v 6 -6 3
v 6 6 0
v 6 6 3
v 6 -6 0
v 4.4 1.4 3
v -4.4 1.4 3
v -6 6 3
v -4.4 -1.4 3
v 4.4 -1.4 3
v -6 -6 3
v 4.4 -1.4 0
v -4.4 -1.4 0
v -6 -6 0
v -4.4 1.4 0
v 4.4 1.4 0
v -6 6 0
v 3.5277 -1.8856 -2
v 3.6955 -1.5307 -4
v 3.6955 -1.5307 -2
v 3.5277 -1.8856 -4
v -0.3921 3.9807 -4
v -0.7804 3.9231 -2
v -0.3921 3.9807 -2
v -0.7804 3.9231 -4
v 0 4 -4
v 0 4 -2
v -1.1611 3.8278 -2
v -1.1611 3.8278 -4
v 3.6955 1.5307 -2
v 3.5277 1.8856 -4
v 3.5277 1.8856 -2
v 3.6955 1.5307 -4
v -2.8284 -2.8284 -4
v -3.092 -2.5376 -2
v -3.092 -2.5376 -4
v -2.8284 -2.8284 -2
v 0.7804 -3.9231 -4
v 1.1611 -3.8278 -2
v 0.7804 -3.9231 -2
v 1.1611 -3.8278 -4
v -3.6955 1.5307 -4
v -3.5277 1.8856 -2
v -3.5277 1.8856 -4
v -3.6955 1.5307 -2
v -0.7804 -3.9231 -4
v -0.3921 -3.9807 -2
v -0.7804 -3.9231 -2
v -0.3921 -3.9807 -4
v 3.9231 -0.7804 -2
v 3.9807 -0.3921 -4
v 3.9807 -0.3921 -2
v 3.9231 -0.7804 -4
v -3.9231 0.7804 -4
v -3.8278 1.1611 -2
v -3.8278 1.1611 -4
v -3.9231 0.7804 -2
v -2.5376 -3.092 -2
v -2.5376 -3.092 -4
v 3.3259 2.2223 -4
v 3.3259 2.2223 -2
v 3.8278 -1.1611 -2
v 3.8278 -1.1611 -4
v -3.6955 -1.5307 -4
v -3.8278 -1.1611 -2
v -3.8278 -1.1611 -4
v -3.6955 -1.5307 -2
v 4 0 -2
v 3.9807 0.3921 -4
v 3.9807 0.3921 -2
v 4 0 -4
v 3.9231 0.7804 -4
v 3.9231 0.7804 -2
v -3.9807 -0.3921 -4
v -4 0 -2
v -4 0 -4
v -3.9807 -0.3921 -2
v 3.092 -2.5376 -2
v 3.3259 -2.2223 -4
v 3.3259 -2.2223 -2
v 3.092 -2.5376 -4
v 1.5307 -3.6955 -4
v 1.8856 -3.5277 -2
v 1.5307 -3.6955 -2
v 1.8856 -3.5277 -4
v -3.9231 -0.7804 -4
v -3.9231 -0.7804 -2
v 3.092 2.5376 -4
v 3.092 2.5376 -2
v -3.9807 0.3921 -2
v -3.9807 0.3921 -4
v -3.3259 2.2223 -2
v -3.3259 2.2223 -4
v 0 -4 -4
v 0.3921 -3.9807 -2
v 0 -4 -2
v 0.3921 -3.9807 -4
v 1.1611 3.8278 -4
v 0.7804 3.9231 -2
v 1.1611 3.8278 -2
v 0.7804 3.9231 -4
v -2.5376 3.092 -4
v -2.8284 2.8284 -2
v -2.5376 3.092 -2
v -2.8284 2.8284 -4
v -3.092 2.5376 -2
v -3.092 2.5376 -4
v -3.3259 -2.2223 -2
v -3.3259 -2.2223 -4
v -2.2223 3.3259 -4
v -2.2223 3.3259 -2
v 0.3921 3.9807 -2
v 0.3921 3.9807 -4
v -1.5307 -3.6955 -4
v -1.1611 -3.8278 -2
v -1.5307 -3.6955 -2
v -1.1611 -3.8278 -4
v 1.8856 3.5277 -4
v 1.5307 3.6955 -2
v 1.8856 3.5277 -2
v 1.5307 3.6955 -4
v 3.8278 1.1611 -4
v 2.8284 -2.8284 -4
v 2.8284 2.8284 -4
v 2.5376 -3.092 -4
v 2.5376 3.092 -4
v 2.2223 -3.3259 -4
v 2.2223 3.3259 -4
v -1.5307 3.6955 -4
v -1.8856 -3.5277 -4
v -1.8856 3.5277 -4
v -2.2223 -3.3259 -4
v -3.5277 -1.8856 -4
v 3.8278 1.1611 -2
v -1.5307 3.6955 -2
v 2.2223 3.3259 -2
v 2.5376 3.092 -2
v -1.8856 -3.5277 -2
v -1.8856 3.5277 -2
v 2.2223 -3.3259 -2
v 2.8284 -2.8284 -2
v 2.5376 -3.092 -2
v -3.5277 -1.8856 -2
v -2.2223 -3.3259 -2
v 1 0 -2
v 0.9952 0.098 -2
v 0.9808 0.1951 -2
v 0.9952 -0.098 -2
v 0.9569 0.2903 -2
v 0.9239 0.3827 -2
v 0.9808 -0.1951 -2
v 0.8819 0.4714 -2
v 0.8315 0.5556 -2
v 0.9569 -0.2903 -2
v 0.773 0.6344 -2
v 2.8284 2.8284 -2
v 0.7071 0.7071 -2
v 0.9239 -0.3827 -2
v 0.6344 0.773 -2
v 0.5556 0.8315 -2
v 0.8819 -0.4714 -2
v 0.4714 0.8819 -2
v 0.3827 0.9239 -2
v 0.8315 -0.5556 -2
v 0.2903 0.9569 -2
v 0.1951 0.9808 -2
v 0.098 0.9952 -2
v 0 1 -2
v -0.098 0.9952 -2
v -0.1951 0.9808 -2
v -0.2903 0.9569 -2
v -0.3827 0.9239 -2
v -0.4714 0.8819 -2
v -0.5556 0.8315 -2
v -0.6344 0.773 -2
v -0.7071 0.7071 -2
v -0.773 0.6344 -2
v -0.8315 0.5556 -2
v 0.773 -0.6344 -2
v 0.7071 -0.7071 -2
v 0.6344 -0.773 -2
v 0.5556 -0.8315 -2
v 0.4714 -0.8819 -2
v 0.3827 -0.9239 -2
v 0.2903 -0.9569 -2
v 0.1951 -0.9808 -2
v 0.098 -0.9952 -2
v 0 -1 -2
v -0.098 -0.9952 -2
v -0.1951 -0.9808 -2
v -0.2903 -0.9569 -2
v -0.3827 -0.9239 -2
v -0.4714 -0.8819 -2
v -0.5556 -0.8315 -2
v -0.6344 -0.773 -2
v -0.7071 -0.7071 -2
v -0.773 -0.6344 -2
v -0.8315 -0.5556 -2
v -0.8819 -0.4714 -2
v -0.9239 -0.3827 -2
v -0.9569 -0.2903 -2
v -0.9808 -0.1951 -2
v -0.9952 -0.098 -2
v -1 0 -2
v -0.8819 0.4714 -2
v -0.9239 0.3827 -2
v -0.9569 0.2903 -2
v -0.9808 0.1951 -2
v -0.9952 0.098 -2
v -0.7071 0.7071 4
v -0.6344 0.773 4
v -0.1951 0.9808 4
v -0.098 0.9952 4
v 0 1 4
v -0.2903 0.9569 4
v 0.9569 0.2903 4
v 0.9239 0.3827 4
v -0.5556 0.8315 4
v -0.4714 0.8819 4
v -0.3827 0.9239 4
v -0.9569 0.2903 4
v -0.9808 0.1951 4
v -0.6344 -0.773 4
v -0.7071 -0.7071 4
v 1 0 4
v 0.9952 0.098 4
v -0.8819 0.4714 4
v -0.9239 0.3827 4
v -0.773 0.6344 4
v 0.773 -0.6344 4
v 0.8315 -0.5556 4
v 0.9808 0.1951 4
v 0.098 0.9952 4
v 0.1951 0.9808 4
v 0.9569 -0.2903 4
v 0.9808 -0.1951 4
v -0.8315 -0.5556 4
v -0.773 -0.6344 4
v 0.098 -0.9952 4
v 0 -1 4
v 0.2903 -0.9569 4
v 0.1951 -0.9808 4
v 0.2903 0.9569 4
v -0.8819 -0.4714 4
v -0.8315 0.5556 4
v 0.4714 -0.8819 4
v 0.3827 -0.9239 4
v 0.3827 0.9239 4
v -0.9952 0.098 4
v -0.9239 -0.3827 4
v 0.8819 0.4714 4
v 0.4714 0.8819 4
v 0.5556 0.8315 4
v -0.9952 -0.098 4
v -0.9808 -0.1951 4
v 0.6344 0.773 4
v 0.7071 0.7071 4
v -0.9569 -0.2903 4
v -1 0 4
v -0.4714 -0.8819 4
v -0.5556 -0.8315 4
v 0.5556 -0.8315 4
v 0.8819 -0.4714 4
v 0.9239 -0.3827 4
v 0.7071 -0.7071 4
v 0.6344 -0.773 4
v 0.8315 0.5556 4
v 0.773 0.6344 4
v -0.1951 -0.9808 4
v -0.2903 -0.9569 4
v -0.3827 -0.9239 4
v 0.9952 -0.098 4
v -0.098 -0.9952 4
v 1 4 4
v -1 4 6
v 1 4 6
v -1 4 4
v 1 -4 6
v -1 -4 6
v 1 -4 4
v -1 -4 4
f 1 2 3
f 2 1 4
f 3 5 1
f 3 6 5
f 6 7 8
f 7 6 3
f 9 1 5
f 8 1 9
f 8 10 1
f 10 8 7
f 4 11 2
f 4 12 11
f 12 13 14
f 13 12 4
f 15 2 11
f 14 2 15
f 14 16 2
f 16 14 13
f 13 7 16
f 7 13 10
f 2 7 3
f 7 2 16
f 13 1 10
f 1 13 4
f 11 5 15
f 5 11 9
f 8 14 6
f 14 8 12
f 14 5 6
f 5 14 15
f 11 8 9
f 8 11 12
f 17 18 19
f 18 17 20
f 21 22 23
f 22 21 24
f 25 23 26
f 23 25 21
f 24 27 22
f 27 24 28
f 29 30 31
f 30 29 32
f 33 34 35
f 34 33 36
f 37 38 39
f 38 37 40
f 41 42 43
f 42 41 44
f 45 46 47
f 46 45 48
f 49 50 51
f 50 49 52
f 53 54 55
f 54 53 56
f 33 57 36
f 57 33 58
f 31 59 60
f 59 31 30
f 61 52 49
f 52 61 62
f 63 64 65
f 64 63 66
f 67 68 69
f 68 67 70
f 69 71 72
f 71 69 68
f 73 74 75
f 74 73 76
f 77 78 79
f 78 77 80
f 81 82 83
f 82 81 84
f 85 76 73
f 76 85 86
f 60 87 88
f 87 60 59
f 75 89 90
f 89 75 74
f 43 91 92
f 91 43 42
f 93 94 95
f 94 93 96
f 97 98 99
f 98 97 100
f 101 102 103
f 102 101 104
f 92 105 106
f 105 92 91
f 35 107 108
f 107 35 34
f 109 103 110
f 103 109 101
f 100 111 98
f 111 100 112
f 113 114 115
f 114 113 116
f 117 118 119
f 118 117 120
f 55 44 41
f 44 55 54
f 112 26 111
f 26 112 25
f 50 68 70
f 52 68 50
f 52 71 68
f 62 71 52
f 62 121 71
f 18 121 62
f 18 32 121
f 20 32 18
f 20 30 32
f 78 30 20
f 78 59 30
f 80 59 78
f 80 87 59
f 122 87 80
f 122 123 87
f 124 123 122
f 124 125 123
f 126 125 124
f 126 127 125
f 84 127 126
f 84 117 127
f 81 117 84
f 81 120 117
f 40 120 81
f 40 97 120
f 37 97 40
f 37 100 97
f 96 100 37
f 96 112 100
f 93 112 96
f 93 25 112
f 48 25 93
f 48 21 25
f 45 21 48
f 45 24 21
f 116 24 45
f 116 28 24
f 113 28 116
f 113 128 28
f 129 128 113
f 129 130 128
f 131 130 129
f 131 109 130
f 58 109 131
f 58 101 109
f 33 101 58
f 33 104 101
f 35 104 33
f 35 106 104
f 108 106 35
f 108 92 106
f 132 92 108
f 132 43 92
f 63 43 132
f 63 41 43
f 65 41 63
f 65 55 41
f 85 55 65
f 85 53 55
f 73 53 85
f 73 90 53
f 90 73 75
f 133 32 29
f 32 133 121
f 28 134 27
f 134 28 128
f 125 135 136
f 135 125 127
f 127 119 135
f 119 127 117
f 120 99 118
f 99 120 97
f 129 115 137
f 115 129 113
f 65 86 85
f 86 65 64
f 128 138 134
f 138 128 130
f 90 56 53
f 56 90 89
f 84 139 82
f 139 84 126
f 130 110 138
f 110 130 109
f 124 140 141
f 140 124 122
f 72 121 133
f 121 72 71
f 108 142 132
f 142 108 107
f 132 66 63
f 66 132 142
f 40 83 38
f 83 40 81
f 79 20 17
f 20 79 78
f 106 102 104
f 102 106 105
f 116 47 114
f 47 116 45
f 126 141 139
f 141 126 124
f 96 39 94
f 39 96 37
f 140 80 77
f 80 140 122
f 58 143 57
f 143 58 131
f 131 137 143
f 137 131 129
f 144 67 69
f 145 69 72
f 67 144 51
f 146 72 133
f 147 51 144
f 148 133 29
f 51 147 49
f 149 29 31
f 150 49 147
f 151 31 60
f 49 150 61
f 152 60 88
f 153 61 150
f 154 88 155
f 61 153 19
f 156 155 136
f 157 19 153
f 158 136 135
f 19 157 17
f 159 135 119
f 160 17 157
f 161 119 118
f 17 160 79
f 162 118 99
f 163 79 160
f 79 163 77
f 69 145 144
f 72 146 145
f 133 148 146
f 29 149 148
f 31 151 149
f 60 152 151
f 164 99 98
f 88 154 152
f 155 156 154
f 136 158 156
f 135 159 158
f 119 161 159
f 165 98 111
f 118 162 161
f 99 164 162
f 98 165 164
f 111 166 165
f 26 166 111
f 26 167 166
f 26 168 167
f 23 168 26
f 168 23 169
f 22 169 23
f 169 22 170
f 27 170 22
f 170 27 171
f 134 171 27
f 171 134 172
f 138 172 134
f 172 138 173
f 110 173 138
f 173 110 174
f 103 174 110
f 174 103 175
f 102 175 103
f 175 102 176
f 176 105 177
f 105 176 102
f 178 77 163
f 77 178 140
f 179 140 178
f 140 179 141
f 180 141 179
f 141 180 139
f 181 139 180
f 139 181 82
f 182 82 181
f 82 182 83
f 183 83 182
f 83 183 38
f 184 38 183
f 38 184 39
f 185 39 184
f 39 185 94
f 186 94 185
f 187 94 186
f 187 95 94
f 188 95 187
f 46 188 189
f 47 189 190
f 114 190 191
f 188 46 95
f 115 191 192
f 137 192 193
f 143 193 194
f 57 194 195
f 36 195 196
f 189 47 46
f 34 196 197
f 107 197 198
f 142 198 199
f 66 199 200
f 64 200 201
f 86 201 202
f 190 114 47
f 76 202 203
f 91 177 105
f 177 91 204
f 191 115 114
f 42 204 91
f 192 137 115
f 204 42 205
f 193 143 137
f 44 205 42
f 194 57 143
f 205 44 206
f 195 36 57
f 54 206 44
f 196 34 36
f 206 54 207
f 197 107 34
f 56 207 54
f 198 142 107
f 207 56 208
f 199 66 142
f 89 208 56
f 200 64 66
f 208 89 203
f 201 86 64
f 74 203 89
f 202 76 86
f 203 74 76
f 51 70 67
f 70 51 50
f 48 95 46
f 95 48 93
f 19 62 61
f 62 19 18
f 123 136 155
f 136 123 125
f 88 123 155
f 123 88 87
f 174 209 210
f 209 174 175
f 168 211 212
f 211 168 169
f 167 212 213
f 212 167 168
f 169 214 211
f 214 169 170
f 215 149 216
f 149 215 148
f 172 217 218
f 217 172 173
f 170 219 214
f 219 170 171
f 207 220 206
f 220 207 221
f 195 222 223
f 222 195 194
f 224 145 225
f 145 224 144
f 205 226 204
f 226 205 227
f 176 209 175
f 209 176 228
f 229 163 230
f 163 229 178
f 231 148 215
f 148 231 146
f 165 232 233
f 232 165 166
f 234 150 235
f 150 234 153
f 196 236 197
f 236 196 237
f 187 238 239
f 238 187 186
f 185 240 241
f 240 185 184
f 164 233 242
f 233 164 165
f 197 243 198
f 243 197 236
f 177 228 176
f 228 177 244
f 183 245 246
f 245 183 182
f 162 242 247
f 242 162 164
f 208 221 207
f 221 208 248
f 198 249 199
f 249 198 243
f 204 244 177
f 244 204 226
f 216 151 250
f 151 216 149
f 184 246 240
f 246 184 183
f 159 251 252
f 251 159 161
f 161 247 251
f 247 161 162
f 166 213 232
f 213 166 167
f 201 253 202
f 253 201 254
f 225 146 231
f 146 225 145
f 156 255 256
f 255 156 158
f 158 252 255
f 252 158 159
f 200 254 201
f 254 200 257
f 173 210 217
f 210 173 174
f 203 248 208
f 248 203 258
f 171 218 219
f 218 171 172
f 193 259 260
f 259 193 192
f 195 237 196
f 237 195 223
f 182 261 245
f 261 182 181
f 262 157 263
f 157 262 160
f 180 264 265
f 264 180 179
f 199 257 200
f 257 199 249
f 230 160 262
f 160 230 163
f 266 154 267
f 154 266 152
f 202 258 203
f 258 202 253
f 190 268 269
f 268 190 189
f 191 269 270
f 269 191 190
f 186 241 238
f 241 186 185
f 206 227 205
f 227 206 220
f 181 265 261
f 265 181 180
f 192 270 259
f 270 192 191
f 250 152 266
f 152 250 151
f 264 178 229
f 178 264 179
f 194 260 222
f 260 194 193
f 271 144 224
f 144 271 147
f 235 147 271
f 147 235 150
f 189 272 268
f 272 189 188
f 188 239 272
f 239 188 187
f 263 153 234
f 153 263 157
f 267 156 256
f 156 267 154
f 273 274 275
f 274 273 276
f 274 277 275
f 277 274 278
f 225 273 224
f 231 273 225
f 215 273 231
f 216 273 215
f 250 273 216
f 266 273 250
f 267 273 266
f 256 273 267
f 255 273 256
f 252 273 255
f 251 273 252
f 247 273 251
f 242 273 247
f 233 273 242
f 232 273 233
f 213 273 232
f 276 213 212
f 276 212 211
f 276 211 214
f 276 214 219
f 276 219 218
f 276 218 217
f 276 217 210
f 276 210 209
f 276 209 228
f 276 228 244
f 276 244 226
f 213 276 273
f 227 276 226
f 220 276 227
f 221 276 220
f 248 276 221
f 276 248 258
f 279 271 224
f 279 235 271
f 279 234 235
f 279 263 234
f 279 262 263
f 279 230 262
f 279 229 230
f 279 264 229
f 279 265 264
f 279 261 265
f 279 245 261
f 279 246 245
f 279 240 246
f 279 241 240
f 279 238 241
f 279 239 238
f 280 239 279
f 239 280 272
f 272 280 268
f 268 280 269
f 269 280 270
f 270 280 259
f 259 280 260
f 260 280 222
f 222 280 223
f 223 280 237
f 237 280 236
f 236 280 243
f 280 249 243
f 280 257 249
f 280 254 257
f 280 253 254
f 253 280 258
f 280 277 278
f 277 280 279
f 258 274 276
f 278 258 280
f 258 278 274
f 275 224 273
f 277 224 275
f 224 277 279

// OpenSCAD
// Original two-piece rigid quarter-turn capture experiment, mm.
// No rotational detent, strength, manufacturing fit or self-locking claim.
agentscad_part = "all";
agentscad_pose = false;
lock_angle = 90;
$fn = 64;
module sleeve_local() {
  difference() {
    translate([-6,-6,0]) cube([12,12,3]);
    translate([-4.4,-1.4,-0.1]) cube([8.8,2.8,3.2]);
  }
}
module pin_local() {
  union() {
    translate([0,0,-4]) cylinder(r=4,h=2);
    translate([0,0,-2.1]) cylinder(r=1,h=6.2);
    translate([-4,-1,4]) cube([8,2,2]);
  }
}
if (agentscad_part == "sleeve") sleeve_local();
if (agentscad_part == "pin") rotate([0,0,agentscad_pose ? lock_angle : 0]) pin_local();
if (agentscad_part == "all") { sleeve_local(); rotate([0,0,lock_angle]) pin_local(); }
